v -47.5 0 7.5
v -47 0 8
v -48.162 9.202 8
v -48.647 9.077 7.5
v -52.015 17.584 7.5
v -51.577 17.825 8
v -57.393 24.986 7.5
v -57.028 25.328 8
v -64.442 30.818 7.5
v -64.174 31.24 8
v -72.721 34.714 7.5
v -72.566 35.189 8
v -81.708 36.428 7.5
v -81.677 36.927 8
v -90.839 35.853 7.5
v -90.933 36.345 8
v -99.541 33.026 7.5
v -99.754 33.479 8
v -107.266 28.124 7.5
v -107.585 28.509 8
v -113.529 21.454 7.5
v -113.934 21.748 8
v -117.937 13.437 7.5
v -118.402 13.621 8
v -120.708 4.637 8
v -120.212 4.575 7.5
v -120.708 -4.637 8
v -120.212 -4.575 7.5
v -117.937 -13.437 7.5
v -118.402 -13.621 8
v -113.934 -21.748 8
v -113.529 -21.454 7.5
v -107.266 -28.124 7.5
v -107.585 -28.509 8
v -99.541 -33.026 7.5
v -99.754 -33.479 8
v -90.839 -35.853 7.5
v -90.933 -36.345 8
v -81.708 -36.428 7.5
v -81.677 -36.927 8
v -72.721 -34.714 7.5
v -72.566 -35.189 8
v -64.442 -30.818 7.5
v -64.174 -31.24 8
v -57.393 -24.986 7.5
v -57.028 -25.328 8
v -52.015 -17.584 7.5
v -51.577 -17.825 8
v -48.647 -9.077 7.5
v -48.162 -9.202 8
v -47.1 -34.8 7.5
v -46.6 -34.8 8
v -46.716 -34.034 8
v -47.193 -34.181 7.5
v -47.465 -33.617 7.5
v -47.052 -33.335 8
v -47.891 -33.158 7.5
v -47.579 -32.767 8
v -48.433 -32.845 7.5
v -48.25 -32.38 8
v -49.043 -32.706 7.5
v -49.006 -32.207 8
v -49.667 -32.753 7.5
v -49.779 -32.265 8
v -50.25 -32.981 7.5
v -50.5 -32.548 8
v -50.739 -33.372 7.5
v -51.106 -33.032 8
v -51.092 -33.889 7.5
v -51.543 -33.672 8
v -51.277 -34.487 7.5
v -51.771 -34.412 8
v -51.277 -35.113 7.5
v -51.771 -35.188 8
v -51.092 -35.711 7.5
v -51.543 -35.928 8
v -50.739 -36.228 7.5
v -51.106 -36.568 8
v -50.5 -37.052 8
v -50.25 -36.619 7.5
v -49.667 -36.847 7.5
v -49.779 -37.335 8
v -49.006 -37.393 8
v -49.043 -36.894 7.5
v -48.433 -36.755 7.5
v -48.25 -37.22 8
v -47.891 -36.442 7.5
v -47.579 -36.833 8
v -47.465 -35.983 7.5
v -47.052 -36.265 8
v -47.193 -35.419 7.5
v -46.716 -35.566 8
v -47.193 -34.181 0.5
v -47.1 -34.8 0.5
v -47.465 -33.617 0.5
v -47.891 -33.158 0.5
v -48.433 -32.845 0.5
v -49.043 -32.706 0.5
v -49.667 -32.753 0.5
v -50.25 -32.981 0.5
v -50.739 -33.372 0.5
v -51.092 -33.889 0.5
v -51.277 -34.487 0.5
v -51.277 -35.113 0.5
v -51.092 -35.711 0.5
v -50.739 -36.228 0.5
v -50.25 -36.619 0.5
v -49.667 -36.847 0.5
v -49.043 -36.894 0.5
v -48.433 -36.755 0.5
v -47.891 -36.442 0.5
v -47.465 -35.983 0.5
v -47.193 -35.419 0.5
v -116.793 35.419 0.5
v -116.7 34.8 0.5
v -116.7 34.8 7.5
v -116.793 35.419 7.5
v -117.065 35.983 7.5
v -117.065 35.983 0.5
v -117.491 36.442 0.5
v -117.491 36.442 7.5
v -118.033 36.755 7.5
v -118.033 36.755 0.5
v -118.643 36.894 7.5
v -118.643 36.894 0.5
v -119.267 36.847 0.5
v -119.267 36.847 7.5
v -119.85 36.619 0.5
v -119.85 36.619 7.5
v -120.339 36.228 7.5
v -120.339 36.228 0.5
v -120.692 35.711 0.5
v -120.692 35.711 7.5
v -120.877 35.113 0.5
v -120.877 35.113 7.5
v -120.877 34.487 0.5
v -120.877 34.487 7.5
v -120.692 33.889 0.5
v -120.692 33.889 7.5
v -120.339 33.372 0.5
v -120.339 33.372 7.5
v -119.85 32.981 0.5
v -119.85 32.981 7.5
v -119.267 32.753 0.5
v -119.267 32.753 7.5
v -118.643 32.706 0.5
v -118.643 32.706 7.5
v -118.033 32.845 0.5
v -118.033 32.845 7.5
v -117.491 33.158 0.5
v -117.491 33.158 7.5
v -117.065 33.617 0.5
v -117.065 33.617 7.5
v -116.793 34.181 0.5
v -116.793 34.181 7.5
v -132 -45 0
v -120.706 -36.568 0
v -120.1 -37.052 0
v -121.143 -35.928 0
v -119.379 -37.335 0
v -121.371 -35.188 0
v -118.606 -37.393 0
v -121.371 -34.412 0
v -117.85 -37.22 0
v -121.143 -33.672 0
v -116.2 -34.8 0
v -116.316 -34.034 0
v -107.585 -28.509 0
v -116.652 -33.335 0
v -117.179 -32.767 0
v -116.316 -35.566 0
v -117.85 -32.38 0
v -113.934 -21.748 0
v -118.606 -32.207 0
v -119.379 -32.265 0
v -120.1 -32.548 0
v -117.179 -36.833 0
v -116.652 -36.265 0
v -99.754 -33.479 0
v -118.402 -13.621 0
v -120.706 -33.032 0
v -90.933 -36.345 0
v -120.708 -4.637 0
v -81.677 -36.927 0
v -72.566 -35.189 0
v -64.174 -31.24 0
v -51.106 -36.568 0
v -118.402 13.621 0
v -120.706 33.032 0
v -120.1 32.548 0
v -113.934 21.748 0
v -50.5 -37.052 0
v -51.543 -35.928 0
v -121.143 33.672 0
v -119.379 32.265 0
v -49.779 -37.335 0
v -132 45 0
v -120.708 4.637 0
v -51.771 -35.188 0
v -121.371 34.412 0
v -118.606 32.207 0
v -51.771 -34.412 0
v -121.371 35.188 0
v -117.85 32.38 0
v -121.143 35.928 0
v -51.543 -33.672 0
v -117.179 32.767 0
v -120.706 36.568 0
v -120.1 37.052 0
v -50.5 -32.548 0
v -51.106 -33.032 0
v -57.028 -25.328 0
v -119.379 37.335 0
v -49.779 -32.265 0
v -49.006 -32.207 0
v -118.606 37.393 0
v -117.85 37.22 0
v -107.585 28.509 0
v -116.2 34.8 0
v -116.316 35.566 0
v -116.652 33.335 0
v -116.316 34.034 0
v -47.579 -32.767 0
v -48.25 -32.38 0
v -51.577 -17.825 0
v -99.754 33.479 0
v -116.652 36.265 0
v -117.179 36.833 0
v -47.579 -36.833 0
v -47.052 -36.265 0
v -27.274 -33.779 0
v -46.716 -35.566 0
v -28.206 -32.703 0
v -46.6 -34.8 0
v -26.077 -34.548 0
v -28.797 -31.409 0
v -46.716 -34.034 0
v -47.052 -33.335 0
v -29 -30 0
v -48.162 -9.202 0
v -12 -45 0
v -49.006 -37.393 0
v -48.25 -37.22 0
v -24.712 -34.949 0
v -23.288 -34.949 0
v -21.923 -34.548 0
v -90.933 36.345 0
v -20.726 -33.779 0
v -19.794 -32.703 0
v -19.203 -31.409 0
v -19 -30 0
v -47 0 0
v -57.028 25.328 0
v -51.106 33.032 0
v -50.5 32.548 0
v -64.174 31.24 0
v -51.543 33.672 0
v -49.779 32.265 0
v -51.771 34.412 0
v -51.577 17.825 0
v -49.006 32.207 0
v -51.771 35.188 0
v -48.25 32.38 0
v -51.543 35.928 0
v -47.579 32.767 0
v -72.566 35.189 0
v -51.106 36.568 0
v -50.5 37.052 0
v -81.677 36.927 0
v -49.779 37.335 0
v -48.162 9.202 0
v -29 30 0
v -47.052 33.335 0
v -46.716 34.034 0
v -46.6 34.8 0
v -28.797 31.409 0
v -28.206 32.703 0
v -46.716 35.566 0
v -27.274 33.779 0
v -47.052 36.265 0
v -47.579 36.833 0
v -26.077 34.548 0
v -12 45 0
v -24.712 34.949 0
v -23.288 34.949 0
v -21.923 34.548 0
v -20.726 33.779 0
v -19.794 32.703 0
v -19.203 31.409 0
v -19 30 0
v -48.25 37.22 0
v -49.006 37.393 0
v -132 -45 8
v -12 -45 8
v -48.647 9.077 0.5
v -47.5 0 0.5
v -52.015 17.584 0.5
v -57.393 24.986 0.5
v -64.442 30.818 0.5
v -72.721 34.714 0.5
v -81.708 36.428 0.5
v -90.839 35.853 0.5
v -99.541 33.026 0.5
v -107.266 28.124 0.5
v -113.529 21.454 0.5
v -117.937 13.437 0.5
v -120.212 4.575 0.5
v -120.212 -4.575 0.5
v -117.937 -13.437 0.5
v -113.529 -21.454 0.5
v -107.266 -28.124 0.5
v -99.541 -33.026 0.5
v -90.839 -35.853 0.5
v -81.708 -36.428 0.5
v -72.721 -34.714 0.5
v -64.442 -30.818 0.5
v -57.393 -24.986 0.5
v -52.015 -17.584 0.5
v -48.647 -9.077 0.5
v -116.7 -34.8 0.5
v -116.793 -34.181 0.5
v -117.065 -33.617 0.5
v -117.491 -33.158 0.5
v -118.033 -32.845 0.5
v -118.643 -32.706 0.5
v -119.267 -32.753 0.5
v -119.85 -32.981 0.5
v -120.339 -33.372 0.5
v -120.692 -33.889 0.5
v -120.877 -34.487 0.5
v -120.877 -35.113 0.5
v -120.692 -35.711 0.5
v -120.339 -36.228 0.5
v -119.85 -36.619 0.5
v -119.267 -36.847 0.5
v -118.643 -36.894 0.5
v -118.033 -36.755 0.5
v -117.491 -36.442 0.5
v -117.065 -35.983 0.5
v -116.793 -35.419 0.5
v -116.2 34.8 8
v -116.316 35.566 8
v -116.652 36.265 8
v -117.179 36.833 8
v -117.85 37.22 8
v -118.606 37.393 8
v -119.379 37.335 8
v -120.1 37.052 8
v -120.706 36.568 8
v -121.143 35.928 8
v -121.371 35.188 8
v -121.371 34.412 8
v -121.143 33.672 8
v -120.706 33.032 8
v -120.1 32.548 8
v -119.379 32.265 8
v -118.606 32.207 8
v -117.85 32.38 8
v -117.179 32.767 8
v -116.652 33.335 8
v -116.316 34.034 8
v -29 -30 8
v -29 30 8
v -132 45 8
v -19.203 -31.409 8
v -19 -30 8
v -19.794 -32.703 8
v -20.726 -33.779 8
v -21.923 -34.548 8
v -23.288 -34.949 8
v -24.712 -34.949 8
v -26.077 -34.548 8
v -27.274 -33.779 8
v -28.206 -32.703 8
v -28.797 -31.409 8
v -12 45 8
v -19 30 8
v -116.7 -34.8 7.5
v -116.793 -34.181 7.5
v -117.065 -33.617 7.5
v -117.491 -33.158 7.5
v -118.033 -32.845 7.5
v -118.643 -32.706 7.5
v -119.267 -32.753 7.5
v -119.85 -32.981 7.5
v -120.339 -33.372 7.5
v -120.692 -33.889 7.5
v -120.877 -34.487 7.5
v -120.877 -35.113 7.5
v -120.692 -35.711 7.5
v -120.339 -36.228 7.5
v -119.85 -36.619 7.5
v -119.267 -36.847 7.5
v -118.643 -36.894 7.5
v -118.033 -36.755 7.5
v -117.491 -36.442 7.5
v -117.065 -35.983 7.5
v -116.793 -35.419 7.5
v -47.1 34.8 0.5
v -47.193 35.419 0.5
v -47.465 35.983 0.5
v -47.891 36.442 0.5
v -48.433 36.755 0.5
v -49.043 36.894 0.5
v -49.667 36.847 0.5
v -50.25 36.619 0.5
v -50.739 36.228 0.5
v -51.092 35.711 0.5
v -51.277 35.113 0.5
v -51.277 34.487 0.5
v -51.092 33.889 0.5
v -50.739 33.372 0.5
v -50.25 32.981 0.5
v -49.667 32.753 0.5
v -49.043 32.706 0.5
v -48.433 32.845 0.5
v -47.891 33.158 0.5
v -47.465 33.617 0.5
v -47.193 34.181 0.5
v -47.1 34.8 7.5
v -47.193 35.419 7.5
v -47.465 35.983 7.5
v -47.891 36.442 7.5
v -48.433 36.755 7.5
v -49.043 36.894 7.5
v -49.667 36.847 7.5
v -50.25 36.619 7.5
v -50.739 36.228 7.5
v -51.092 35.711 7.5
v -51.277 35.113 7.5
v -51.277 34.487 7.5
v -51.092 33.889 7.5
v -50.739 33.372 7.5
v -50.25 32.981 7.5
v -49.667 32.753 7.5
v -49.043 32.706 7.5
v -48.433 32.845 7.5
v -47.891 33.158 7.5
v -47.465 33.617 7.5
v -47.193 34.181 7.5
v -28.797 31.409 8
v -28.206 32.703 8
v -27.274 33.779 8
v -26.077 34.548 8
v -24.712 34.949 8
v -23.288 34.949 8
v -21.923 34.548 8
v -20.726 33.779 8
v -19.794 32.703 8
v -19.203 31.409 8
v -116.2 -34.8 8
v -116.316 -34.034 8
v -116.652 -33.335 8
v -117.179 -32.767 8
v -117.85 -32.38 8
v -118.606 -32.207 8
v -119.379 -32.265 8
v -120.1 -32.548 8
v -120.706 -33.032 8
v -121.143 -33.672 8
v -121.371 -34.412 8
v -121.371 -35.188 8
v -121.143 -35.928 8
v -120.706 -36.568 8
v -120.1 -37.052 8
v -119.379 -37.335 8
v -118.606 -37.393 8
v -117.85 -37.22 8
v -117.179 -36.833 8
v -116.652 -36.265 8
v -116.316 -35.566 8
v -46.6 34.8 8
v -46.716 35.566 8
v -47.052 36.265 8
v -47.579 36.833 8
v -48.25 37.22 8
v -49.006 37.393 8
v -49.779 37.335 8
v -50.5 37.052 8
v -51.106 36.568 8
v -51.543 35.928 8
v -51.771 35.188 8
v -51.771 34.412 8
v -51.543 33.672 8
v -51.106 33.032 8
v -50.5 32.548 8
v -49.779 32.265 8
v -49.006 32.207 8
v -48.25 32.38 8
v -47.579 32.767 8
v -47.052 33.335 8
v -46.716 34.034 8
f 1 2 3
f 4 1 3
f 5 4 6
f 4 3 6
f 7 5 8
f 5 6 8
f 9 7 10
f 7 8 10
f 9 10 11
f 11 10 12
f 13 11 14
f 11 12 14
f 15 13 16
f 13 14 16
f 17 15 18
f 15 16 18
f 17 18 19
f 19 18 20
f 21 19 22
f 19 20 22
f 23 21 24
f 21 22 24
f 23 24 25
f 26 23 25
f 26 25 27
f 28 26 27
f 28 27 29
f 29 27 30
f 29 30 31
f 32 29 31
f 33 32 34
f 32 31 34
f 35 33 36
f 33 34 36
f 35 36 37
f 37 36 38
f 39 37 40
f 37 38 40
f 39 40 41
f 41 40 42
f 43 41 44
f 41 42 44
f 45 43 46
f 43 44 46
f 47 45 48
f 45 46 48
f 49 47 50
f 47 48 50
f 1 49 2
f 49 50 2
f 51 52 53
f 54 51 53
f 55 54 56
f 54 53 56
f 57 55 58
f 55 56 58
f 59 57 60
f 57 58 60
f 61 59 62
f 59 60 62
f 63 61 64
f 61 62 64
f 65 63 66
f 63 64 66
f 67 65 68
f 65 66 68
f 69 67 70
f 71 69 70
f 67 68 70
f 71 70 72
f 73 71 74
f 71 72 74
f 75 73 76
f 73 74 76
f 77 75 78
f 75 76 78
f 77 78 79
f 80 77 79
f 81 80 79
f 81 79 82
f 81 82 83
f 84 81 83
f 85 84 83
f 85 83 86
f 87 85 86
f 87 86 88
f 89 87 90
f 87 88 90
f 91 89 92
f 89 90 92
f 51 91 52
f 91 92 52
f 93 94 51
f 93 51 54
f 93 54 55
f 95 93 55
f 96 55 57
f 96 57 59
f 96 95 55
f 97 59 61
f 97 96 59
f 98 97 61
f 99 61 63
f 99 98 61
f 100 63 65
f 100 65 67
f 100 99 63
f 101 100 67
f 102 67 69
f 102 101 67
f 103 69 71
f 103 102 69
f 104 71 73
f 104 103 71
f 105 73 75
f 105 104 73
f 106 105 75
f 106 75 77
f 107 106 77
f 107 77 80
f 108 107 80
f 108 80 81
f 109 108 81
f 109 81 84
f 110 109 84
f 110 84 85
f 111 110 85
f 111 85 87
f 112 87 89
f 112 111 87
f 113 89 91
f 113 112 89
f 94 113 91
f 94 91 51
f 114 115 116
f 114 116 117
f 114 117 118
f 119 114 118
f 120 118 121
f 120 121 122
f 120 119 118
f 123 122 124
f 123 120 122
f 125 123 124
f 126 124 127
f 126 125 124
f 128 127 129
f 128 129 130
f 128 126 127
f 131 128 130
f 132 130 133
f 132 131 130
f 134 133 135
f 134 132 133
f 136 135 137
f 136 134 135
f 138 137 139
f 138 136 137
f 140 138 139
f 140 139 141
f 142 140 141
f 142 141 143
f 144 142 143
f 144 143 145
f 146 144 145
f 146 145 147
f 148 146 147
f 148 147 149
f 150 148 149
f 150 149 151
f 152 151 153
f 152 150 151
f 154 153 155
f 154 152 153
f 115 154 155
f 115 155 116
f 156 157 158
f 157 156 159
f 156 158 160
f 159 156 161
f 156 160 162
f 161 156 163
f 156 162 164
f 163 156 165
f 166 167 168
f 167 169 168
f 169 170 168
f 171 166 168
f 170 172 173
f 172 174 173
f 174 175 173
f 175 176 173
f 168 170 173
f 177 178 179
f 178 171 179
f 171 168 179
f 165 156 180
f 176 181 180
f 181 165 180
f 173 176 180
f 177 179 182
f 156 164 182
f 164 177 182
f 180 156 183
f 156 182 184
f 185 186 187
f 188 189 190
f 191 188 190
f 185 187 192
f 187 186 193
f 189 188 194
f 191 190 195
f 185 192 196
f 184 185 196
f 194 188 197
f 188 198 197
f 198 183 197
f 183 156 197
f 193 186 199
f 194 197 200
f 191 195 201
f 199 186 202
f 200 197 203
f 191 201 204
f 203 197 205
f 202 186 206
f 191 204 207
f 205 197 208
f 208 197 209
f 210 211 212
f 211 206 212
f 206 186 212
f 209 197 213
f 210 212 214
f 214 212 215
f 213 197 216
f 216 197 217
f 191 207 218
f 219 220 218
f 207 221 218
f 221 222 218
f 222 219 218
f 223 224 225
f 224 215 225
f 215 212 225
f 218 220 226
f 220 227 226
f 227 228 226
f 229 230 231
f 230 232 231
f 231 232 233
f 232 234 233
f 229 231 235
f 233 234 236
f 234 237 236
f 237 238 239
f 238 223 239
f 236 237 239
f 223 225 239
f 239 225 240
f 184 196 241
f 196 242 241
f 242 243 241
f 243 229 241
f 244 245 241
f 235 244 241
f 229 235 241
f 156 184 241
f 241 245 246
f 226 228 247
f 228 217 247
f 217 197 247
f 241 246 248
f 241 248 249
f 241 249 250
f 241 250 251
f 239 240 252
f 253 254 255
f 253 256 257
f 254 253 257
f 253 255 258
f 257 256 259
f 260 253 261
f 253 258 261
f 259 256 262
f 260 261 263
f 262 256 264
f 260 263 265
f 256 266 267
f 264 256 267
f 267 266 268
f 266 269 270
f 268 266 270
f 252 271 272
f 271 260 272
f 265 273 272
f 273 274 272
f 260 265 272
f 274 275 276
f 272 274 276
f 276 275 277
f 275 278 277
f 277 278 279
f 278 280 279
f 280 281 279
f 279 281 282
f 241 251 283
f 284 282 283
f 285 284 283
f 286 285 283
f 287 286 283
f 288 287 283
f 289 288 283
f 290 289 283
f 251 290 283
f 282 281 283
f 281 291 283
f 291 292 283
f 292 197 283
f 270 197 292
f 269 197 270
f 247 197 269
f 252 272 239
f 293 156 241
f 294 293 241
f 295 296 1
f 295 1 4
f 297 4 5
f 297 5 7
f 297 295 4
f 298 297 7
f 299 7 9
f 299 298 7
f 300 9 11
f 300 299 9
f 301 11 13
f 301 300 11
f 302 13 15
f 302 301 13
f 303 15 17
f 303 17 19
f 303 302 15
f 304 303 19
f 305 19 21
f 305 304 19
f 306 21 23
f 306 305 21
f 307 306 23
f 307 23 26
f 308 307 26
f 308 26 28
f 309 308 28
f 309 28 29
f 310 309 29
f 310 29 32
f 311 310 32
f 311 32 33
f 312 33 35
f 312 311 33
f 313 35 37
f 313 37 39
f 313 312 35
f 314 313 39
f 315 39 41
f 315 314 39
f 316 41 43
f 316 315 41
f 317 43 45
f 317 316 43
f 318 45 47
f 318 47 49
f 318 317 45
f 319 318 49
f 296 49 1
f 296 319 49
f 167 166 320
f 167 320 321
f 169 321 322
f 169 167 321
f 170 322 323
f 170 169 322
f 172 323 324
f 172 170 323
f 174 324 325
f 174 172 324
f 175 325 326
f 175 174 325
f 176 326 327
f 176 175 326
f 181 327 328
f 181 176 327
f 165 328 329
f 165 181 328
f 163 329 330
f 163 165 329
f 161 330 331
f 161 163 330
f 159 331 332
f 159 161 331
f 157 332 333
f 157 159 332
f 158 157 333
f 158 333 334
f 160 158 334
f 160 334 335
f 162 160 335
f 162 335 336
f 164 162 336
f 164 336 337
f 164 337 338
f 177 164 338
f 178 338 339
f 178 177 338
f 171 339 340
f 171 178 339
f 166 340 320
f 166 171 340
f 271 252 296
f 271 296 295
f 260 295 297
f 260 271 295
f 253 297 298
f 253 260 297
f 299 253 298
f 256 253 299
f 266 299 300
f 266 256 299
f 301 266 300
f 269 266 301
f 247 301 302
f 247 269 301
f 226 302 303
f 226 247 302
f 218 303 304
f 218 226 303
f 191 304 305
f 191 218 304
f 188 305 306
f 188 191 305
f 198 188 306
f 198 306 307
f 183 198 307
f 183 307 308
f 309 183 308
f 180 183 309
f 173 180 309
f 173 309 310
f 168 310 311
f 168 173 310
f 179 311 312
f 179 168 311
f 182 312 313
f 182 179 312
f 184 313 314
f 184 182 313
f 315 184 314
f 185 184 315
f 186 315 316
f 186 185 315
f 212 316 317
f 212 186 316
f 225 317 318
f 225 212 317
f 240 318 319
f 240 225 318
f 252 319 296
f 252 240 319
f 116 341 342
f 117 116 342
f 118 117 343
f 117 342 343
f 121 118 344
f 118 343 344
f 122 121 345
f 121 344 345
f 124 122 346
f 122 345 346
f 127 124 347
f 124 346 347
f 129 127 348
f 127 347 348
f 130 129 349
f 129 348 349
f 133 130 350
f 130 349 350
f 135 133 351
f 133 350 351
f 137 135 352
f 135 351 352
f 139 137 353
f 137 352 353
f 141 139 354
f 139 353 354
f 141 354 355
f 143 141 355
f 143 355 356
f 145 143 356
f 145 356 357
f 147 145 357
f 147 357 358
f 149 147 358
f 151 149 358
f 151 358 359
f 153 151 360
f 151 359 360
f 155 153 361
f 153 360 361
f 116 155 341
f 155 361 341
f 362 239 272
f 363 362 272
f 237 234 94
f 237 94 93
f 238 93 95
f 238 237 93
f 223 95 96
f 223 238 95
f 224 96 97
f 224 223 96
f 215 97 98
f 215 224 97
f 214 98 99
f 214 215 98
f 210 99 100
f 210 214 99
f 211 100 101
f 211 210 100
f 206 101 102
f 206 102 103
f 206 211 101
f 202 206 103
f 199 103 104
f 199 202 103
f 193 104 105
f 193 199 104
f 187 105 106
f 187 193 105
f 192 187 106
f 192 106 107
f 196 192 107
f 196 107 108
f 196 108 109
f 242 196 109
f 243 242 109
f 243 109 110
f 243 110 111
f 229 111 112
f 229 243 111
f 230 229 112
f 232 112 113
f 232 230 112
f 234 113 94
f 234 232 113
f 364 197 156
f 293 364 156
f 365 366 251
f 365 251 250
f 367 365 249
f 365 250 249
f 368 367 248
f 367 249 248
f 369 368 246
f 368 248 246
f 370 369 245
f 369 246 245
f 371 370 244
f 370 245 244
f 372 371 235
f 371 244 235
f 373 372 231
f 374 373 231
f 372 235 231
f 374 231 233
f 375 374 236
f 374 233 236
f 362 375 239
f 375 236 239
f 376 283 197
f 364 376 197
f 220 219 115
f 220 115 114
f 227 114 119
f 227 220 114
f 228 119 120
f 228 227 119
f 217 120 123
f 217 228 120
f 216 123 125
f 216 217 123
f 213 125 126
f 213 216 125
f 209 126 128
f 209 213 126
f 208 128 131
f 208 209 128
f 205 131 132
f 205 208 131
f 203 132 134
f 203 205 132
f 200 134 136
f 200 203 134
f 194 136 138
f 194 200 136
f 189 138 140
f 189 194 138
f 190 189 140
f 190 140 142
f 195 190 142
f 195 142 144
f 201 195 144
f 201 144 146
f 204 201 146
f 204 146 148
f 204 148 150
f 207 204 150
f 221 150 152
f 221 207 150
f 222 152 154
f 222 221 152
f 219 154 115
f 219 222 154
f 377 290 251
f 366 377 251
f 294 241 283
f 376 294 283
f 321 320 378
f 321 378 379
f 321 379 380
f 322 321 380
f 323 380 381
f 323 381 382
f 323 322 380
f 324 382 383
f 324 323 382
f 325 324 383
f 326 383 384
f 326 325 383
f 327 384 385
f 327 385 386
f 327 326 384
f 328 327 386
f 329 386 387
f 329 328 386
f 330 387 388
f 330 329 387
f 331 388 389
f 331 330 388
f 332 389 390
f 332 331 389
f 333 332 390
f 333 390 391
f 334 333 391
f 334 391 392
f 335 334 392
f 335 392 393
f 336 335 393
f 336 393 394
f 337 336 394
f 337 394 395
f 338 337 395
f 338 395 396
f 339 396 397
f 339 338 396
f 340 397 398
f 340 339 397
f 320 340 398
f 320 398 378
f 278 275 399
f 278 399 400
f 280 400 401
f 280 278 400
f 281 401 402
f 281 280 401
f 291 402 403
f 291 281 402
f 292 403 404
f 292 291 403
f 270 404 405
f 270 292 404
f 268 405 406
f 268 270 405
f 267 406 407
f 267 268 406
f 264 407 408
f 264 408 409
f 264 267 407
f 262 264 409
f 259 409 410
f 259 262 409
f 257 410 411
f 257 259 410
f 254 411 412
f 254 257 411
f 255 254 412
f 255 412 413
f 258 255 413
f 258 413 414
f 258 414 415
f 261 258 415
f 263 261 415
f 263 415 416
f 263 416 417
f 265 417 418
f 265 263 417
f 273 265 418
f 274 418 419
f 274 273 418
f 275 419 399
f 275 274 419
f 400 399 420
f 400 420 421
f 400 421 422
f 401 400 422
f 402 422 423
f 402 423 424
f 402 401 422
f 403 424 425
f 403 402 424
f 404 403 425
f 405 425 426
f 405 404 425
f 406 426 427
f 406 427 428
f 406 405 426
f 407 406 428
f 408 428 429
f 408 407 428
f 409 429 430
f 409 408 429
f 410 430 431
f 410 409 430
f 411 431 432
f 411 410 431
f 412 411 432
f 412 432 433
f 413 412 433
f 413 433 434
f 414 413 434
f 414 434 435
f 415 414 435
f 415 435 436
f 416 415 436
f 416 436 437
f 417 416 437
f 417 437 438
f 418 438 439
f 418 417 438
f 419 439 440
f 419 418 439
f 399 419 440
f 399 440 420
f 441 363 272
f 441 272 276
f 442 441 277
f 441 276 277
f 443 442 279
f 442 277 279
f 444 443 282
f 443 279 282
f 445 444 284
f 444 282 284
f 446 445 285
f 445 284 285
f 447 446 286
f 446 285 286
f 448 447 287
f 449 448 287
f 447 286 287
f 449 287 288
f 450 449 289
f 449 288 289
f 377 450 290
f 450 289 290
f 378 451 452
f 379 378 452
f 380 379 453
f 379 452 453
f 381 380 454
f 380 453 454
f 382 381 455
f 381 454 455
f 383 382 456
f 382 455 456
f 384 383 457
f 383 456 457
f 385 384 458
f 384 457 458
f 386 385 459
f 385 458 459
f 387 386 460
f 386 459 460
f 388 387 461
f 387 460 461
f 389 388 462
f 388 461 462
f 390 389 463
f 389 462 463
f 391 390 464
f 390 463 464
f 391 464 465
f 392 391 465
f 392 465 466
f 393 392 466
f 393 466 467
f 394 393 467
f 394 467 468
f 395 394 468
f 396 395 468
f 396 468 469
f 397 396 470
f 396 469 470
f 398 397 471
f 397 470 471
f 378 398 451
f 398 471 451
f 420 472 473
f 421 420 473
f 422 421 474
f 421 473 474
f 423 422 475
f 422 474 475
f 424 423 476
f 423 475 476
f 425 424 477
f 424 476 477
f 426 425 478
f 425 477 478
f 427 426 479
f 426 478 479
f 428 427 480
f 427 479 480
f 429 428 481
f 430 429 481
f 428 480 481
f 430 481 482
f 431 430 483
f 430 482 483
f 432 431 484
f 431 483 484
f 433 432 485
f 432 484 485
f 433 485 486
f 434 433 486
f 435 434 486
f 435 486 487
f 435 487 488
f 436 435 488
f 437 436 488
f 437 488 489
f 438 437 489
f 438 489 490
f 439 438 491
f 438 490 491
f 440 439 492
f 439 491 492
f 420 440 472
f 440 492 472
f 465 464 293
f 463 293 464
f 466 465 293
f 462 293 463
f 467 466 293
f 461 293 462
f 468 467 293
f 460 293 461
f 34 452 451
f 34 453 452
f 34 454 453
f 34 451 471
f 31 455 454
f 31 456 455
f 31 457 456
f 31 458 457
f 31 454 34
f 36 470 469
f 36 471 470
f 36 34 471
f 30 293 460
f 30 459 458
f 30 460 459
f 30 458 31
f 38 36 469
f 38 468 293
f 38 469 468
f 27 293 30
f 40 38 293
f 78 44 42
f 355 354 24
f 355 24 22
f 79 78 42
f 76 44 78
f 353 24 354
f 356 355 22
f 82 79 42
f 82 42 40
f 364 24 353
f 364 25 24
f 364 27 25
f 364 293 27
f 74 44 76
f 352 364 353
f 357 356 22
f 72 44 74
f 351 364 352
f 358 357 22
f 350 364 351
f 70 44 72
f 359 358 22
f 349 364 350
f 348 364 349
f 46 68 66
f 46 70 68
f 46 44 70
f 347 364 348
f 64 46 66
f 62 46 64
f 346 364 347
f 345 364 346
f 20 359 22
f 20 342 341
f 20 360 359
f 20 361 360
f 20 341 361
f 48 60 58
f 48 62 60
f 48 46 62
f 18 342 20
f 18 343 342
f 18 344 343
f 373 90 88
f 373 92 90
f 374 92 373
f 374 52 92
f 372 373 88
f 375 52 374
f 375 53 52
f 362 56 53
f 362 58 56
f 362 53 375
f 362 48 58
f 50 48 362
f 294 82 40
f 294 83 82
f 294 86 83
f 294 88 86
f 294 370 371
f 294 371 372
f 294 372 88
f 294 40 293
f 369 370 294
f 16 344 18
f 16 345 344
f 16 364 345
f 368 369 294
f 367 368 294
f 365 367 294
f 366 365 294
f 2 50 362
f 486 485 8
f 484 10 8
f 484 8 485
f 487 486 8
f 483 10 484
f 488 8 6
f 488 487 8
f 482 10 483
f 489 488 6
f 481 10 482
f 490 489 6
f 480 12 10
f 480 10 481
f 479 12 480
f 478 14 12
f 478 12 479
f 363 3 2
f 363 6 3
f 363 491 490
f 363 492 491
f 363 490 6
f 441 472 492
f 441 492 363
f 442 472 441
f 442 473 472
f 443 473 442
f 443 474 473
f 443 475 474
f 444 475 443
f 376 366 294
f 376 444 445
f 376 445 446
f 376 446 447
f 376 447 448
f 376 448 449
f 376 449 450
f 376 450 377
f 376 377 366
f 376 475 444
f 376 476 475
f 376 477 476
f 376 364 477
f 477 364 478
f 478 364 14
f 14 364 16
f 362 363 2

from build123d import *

# Parameters (mm, degrees)
F0_R     = 2.1
F0_R_2   = 36.5
F1_DEPTH = 8
F2_SIZE  = 0.5


with BuildPart() as f1:
    # F0 (on Top) → F1 (new body)
    with BuildSketch(Plane.XY):
        Polygon((-37, 45), (-132, 45), (-132, -45), (-37, -45), (-12, -45), (-12, 0), (-12, 45), align=None)
        with Locations((-118.8, -34.8)):
            Circle(F0_R, mode=Mode.SUBTRACT)
        with Locations((-49.2, -34.8)):
            Circle(F0_R, mode=Mode.SUBTRACT)
        with Locations((-84, 0)):
            Circle(F0_R_2, mode=Mode.SUBTRACT)
        with Locations((-118.8, 34.8)):
            Circle(F0_R, mode=Mode.SUBTRACT)
        with BuildLine():
            ThreePointArc((-29, 30), (-24, 35), (-19, 30))
            Line((-19, 30), (-19, -30))
            ThreePointArc((-19, -30), (-24, -35), (-29, -30))
            Line((-29, -30), (-29, 30))
        make_face(mode=Mode.SUBTRACT)
        with Locations((-49.2, 34.8)):
            Circle(F0_R, mode=Mode.SUBTRACT)
    extrude(amount=F1_DEPTH)

    # F2
    f2_edges = [f1.edges().sort_by_distance(p)[0] for p in [
        (-47.5, 0, 4),
        (-120.5, 0, 0),
        (-120.5, 0, 8),
        (-116.7, -34.8, 4),
        (-120.9, -34.8, 0),
        (-120.9, -34.8, 8),
        (-116.7, 34.8, 4),
        (-120.9, 34.8, 0),
        (-120.9, 34.8, 8),
        (-47.1, 34.8, 4),
        (-51.3, 34.8, 0),
        (-51.3, 34.8, 8),
        (-47.1, -34.8, 4),
        (-51.3, -34.8, 0),
        (-51.3, -34.8, 8),
    ]]
    chamfer(f2_edges, length=F2_SIZE)


solid = f1.part
